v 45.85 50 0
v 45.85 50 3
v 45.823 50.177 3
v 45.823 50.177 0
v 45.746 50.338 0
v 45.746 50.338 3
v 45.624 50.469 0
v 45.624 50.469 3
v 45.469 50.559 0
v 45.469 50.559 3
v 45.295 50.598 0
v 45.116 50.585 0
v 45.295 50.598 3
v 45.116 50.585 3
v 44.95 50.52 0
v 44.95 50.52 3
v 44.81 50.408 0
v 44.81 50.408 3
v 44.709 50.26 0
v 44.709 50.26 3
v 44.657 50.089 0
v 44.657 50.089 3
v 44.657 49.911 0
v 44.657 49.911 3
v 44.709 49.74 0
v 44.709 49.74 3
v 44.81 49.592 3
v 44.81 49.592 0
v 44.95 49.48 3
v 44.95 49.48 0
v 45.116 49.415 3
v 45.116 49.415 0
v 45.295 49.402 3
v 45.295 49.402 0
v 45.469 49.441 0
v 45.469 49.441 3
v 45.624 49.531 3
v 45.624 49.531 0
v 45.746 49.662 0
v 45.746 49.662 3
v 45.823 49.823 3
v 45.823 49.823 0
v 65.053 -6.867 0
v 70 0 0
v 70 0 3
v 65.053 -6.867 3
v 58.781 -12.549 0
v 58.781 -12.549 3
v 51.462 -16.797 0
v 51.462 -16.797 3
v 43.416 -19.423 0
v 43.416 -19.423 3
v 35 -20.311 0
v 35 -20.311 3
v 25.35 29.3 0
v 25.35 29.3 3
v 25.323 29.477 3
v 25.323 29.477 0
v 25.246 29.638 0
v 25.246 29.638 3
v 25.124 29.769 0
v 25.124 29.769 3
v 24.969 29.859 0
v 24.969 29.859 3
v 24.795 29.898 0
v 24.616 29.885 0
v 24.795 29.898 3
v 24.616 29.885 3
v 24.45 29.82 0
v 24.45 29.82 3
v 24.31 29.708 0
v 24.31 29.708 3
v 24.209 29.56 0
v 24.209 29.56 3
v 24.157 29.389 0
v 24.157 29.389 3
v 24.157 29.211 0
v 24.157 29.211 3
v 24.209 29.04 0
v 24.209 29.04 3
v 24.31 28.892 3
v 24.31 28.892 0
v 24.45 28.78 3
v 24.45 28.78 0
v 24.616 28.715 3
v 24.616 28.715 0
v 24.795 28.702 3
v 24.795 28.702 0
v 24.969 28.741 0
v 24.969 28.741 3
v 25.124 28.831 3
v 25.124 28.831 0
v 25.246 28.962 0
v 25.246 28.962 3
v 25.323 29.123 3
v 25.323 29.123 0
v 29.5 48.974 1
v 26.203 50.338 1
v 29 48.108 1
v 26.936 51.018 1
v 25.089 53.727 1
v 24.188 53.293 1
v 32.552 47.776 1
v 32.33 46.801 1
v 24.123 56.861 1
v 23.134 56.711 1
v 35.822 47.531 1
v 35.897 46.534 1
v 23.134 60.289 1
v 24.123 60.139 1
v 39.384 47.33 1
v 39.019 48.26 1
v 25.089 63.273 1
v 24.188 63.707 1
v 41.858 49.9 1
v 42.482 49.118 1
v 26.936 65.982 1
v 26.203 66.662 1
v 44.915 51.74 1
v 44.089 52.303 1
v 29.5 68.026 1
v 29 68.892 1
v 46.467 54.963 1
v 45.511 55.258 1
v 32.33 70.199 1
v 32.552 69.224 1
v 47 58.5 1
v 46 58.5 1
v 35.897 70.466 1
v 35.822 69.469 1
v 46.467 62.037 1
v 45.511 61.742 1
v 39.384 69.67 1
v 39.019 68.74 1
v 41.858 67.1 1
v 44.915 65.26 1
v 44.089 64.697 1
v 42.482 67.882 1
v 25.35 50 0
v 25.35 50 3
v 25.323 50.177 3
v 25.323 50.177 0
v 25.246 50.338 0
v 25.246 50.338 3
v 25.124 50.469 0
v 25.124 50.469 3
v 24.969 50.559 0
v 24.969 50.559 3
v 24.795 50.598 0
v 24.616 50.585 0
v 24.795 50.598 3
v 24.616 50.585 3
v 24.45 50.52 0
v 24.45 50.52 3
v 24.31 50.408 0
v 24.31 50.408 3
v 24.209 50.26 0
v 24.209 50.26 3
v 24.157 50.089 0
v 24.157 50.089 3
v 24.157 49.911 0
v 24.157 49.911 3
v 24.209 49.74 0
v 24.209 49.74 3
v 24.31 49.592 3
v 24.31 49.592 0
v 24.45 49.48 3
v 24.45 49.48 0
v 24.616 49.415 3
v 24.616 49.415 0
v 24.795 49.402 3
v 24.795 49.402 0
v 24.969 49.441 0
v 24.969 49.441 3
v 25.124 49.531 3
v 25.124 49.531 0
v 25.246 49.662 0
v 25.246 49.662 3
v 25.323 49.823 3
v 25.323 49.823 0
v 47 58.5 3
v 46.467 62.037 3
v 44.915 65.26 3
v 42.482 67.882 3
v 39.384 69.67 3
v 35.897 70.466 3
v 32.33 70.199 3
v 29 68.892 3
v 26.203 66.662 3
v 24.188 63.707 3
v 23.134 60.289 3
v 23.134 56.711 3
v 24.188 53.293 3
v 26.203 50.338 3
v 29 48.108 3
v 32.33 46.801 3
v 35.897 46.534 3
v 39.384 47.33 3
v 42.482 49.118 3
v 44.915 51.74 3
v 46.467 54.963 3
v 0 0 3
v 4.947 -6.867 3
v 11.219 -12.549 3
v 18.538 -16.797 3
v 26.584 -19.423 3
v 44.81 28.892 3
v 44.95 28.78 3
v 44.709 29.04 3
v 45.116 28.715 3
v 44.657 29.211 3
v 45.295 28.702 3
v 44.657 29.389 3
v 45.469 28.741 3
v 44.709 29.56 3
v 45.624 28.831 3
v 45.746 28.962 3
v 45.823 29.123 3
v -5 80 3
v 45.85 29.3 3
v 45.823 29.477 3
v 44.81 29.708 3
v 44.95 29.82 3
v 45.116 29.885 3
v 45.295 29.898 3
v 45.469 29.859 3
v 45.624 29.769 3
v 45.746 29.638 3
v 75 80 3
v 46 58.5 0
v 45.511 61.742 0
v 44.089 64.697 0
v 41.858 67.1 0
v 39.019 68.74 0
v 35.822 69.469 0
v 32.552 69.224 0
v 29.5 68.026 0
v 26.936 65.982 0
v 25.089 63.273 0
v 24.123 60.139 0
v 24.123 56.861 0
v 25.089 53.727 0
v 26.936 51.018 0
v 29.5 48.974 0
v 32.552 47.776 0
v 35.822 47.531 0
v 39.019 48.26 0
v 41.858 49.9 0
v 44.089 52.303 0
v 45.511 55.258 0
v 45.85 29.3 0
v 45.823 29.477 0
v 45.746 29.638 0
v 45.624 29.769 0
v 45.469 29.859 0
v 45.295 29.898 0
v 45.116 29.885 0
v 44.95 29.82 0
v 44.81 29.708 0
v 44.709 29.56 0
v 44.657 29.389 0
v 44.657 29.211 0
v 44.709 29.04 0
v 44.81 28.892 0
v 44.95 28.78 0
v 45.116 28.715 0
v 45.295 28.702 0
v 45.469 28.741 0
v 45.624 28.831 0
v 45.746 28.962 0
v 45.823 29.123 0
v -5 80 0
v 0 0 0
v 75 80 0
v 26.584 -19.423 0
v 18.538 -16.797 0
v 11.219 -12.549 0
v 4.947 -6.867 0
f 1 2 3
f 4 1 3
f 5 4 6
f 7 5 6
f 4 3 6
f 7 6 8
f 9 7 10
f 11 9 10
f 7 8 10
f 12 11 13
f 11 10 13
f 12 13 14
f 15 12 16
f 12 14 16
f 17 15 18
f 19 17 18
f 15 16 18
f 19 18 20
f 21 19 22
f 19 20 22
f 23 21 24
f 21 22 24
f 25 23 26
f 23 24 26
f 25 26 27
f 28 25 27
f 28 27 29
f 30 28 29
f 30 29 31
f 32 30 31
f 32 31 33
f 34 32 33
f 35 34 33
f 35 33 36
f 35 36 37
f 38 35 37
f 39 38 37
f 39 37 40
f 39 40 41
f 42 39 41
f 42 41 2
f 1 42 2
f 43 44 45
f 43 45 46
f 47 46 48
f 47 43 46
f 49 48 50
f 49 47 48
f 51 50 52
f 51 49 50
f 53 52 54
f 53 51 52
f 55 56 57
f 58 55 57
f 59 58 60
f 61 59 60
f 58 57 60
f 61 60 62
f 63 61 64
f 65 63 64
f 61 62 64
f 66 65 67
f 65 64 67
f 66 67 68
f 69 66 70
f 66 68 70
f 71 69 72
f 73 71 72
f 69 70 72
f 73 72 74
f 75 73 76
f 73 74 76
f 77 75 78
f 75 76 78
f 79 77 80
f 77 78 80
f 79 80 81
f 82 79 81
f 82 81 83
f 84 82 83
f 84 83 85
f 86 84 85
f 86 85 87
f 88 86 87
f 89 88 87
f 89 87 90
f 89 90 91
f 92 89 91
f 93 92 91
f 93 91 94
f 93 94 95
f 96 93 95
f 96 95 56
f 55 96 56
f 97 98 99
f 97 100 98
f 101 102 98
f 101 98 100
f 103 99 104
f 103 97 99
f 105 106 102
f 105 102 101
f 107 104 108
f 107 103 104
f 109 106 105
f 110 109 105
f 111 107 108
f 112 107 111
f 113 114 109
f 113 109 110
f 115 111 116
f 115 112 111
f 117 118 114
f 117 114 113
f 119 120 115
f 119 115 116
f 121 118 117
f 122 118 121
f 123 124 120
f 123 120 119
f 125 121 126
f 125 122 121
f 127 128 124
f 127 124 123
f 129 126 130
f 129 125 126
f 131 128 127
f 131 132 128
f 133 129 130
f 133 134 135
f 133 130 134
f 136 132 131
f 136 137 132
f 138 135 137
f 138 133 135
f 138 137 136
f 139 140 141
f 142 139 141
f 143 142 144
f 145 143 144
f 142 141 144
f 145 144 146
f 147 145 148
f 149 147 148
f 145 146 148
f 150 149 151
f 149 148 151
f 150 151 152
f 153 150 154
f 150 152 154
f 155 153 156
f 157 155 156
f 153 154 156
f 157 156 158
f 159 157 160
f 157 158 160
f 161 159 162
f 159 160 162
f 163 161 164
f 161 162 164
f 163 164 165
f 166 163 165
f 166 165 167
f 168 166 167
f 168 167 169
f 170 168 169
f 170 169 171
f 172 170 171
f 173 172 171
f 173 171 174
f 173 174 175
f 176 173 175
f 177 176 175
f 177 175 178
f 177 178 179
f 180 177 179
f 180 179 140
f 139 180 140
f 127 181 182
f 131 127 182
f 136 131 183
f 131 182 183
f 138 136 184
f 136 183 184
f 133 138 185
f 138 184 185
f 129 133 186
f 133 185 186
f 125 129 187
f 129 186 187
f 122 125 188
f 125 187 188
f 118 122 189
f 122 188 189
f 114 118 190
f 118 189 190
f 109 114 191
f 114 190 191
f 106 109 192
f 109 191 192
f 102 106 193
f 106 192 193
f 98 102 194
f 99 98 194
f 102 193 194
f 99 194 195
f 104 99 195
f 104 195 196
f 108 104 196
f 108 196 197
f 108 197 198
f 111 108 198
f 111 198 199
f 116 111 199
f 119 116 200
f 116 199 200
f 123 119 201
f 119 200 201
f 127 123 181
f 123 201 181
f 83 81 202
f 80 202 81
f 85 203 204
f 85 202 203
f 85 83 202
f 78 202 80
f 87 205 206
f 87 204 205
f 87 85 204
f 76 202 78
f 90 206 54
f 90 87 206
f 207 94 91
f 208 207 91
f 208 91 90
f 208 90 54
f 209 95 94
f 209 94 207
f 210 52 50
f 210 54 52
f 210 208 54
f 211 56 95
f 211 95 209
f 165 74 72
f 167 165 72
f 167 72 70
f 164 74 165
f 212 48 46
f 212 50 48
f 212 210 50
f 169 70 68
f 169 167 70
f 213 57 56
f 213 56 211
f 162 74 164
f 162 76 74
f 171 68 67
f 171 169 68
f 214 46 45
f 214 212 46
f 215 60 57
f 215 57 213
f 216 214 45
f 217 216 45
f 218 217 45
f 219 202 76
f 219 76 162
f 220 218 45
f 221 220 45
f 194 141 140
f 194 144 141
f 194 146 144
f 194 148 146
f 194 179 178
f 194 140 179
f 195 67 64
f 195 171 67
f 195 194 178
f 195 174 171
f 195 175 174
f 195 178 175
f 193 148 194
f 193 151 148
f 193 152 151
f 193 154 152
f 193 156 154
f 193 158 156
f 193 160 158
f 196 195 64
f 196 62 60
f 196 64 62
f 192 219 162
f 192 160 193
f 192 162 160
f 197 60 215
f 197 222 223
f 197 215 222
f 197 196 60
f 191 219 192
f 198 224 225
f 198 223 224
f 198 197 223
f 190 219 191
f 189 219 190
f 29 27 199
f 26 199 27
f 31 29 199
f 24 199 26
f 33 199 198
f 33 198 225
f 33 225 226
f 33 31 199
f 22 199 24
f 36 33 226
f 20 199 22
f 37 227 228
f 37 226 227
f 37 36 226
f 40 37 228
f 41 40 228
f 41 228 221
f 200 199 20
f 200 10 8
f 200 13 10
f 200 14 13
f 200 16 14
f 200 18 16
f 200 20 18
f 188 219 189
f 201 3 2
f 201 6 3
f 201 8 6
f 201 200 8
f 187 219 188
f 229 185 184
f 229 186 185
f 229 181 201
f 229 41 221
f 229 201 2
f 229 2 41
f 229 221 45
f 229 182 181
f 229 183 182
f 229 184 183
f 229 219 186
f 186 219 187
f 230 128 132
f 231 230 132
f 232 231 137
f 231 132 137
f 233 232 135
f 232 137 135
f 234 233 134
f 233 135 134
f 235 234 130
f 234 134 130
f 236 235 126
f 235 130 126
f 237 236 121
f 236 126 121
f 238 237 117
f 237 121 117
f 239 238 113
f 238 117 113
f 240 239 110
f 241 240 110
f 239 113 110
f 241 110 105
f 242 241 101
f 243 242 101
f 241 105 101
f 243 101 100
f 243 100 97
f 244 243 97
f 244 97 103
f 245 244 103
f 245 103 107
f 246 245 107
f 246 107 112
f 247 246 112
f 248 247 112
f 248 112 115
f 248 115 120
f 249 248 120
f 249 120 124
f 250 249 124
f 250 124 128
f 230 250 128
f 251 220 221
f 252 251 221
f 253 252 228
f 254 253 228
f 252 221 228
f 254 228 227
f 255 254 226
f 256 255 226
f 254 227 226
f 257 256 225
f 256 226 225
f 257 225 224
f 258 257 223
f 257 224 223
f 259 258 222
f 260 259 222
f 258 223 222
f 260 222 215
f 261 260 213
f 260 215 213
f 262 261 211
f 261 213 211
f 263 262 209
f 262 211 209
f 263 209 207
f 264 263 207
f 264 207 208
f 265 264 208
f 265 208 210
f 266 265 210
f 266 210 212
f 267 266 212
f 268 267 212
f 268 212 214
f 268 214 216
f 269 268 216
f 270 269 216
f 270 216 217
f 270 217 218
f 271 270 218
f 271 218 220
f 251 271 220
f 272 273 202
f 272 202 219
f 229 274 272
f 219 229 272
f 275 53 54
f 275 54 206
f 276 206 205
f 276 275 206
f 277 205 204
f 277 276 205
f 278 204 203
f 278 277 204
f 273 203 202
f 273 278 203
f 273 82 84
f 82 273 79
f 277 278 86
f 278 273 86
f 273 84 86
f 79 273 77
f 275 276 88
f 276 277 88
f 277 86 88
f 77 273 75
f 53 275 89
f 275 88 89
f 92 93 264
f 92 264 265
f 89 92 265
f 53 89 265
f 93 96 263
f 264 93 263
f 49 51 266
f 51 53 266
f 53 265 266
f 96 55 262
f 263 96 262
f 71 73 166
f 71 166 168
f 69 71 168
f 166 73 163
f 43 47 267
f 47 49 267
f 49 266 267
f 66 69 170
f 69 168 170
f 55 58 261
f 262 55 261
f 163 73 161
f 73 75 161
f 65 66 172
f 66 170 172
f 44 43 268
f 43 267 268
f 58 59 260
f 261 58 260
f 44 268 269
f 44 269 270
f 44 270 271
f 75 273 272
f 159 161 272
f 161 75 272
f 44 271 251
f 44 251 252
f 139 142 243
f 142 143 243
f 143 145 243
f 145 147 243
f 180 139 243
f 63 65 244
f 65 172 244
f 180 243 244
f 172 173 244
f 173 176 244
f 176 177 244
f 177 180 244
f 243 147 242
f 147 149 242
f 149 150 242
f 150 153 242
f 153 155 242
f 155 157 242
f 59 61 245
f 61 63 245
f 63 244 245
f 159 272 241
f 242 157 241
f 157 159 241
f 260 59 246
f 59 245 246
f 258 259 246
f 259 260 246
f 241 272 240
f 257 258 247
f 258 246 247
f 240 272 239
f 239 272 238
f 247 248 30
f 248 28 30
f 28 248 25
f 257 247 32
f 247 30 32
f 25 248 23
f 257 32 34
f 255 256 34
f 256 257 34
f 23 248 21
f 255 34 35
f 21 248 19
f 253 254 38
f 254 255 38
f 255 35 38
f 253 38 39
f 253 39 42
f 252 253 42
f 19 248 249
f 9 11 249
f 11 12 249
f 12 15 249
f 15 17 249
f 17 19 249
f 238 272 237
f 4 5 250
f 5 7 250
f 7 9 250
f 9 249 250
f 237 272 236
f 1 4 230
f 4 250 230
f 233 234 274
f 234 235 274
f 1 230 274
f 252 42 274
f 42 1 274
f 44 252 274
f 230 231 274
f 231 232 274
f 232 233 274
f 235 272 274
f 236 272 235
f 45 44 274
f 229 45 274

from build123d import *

# Parameters (mm, degrees)
SKETCH_1_W          = 70
SKETCH_1_H          = 80
EXTRUDE_1_DEPTH     = 3
CUT_EXTRUDE_1_REACH = 108.344
SKETCH_2_R          = 0.6
SKETCH_2_R_2        = 11
SKETCH_3_R          = 12
CUT_EXTRUDE_2_DEPTH = 2
EXTRUDE_2_DEPTH     = 3


with BuildPart() as part:
    # 草图1 → 凸台-拉伸1 (new body)
    with BuildSketch(Plane.XY):
        with Locations((35, 40)):
            Rectangle(SKETCH_1_W, SKETCH_1_H)
    extrude(amount=EXTRUDE_1_DEPTH)

    # 草图2 → 切除-拉伸1 (cut, up to next)
    with BuildSketch(Plane.XY.offset(3), mode=Mode.PRIVATE) as cut_extrude_1_sk1:
        with Locations((24.75, 50)):
            Circle(SKETCH_2_R)
    cut_extrude_1_tool1 = extrude(cut_extrude_1_sk1.sketch, amount=-CUT_EXTRUDE_1_REACH, mode=Mode.PRIVATE) & part.part
    # 草图2 → 切除-拉伸1 (cut, up to next)
    with BuildSketch(Plane.XY.offset(3), mode=Mode.PRIVATE) as cut_extrude_1_sk2:
        with Locations((45.25, 50)):
            Circle(SKETCH_2_R)
    cut_extrude_1_tool2 = extrude(cut_extrude_1_sk2.sketch, amount=-CUT_EXTRUDE_1_REACH, mode=Mode.PRIVATE) & part.part
    # 草图2 → 切除-拉伸1 (cut, up to next)
    with BuildSketch(Plane.XY.offset(3), mode=Mode.PRIVATE) as cut_extrude_1_sk3:
        with Locations((45.25, 29.3)):
            Circle(SKETCH_2_R)
    cut_extrude_1_tool3 = extrude(cut_extrude_1_sk3.sketch, amount=-CUT_EXTRUDE_1_REACH, mode=Mode.PRIVATE) & part.part
    # 草图2 → 切除-拉伸1 (cut, up to next)
    with BuildSketch(Plane.XY.offset(3), mode=Mode.PRIVATE) as cut_extrude_1_sk4:
        with Locations((24.75, 29.3)):
            Circle(SKETCH_2_R)
    cut_extrude_1_tool4 = extrude(cut_extrude_1_sk4.sketch, amount=-CUT_EXTRUDE_1_REACH, mode=Mode.PRIVATE) & part.part
    # 草图2 → 切除-拉伸1 (cut, up to next)
    with BuildSketch(Plane.XY.offset(3), mode=Mode.PRIVATE) as cut_extrude_1_sk5:
        with Locations((35, 58.5)):
            Circle(SKETCH_2_R_2)
    cut_extrude_1_tool5 = extrude(cut_extrude_1_sk5.sketch, amount=-CUT_EXTRUDE_1_REACH, mode=Mode.PRIVATE) & part.part
    add(cut_extrude_1_tool1.solids().sort_by_distance((24.75, 50, 3))[0], mode=Mode.SUBTRACT)
    add(cut_extrude_1_tool2.solids().sort_by_distance((45.25, 50, 3))[0], mode=Mode.SUBTRACT)
    add(cut_extrude_1_tool3.solids().sort_by_distance((45.25, 29.3, 3))[0], mode=Mode.SUBTRACT)
    add(cut_extrude_1_tool4.solids().sort_by_distance((24.75, 29.3, 3))[0], mode=Mode.SUBTRACT)
    add(cut_extrude_1_tool5.solids().sort_by_distance((35, 58.5, 3))[0], mode=Mode.SUBTRACT)

    # 草图3 → 切除-拉伸2 (cut)
    with BuildSketch(Plane.XY.offset(3)):
        with Locations((35, 58.5)):
            Circle(SKETCH_3_R)
    extrude(amount=-CUT_EXTRUDE_2_DEPTH, mode=Mode.SUBTRACT)

    # 草图5 → 凸台-拉伸2 (add)
    with BuildSketch(Plane(origin=(0, 0, 0), x_dir=(-1, 0, 0), z_dir=(0, 0, -1))):
        Polygon((-75, 80), (-70, 80), (-70, 0), align=None)
        Polygon((0, 0), (5, 80), (0, 80), align=None)
        with BuildLine():
            Line((0, 0), (-35, 0))
            Line((-35, 0), (-35, -20.311288741))
            ThreePointArc((-35, -20.311288741), (-14.766683105, -14.865640499), (0, 0))
        make_face()
        with BuildLine():
            Line((-35, -20.311288741), (-35, 0))
            Line((-35, 0), (-70, 0))
            ThreePointArc((-70, 0), (-55.233316895, -14.865640499), (-35, -20.311288741))
        make_face()
        with BuildLine():
            Line((0, 0), (-35, 0))
            Line((-35, 0), (-35, -20.311288741))
            ThreePointArc((-35, -20.311288741), (-14.766683105, -14.865640499), (0, 0))
        make_face()
        with BuildLine():
            Line((-35, -20.311288741), (-35, 0))
            Line((-35, 0), (-70, 0))
            ThreePointArc((-70, 0), (-55.233316895, -14.865640499), (-35, -20.311288741))
        make_face()
    extrude(amount=-EXTRUDE_2_DEPTH)


solid = part.part
